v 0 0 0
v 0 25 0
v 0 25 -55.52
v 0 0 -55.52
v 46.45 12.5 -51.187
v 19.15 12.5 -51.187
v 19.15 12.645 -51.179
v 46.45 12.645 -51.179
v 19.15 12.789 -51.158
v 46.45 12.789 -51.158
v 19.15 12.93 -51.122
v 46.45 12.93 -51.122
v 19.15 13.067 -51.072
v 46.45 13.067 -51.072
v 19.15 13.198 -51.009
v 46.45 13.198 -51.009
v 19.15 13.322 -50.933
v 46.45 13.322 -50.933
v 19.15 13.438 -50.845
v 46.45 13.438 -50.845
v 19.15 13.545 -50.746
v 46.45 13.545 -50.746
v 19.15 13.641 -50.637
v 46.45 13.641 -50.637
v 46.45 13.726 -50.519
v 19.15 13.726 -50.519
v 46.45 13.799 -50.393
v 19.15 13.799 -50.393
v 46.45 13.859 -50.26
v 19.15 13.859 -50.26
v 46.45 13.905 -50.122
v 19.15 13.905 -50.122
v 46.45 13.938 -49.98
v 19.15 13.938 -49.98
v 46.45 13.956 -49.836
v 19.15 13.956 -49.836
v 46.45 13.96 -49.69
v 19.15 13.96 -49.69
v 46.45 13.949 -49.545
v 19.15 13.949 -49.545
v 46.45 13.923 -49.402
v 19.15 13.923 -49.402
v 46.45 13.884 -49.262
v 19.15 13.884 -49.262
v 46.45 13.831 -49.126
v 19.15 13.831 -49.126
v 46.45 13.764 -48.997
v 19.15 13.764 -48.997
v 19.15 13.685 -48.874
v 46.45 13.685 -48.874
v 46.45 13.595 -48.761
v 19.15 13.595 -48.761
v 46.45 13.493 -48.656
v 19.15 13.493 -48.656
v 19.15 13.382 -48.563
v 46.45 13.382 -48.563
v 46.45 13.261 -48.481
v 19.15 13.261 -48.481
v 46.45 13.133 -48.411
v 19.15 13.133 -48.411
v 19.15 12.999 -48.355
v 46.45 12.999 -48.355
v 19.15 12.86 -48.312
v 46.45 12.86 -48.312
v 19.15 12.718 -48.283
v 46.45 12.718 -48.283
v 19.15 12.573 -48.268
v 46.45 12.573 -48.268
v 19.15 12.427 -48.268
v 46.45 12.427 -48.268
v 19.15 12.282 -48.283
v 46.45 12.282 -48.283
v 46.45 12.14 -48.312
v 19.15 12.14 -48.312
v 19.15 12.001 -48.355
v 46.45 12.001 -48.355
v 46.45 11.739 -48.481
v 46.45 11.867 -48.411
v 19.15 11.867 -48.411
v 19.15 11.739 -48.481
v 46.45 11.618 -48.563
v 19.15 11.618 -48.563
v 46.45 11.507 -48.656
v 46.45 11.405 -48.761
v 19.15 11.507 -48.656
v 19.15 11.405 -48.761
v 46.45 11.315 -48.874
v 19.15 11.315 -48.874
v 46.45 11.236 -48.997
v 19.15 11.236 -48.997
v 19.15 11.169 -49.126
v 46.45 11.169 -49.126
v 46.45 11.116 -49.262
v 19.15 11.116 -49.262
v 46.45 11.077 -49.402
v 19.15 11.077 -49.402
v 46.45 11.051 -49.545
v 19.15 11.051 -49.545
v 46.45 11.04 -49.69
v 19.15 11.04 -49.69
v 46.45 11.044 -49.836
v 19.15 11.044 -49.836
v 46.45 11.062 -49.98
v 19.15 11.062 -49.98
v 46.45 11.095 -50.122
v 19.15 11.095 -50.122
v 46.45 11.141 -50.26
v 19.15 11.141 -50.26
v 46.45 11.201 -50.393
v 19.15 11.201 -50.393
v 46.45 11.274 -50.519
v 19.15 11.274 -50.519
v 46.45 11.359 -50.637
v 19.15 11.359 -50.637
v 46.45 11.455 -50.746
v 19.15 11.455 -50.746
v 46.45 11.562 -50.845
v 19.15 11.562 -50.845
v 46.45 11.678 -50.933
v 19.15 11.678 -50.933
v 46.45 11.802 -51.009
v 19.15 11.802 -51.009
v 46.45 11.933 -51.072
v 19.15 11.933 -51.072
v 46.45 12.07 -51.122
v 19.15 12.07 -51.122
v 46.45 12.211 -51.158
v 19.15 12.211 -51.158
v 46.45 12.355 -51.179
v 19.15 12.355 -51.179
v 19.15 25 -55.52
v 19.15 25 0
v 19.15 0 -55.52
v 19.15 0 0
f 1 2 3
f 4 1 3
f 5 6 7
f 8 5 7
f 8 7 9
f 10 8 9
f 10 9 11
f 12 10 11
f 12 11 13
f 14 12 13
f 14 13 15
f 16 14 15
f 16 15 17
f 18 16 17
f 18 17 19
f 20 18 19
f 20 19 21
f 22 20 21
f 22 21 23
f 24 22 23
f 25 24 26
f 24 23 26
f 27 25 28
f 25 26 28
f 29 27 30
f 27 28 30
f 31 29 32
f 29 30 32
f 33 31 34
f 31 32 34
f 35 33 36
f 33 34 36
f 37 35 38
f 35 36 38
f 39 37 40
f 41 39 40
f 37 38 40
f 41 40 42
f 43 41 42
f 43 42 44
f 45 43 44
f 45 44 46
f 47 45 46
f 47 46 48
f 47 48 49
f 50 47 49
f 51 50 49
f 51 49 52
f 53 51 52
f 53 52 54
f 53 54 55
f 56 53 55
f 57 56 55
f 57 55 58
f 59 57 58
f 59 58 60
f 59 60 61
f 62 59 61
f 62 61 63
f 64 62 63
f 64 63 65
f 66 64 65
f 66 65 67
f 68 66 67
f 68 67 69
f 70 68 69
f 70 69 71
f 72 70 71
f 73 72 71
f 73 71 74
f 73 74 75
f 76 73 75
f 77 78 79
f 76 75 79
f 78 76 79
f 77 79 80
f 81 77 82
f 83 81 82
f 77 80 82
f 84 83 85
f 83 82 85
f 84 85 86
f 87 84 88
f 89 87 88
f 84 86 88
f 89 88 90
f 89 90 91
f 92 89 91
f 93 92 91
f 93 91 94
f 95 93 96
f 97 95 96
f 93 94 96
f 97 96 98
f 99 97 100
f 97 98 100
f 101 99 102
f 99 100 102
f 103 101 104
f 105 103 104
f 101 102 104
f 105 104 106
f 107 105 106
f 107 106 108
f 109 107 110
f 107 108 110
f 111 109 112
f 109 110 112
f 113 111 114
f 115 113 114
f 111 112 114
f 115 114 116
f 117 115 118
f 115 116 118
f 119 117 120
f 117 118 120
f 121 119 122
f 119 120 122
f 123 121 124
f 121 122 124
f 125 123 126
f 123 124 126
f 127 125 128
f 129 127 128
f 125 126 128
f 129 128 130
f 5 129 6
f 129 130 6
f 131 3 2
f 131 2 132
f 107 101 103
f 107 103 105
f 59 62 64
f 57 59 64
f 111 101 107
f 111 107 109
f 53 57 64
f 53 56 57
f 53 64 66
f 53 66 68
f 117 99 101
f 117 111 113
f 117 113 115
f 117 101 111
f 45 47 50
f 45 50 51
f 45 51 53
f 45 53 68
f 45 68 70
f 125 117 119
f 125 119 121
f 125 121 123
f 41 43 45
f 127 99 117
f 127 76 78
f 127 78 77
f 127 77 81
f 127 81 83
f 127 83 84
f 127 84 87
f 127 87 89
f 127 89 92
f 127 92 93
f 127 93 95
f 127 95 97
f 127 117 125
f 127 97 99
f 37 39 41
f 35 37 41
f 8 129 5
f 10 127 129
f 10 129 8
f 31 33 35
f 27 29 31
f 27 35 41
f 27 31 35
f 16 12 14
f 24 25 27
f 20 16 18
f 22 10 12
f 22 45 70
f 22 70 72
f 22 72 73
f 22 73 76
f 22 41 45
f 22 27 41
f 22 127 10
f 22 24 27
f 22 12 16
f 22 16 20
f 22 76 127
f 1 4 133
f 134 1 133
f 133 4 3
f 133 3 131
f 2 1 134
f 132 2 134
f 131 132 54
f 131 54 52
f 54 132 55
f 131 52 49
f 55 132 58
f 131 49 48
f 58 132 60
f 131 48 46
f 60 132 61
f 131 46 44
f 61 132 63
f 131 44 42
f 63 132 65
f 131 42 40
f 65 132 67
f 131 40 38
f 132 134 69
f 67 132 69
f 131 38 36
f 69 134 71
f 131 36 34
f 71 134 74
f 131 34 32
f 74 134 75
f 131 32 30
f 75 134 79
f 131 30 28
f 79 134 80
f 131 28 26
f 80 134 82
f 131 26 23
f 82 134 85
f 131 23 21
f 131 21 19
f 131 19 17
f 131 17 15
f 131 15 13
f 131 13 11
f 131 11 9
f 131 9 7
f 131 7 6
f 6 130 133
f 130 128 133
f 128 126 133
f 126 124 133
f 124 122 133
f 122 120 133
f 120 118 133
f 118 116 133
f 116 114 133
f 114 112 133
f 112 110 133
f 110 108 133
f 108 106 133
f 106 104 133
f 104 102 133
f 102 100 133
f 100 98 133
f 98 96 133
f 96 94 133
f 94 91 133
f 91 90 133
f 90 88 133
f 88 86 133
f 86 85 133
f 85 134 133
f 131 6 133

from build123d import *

# Parameters (mm, degrees)
ESQUISSE1_W        = 19.15
ESQUISSE1_H        = 55.52
BOSS_EXTRU_1_DEPTH = 25
ESQUISSE3_R        = 1.46
BOSS_EXTRU_2_DEPTH = 46.45


with BuildPart() as part:
    # Esquisse1 → Boss.-Extru.1 (new body)
    with BuildSketch(Plane(origin=(0, 0, 0), x_dir=(1, 0, 0), z_dir=(0, 1, 0))):
        with Locations((9.575, 27.76)):
            Rectangle(ESQUISSE1_W, ESQUISSE1_H)
    extrude(amount=BOSS_EXTRU_1_DEPTH)

    # Esquisse3 → Boss.-Extru.2 (add)
    with BuildSketch(Plane(origin=(0, 0, 0), x_dir=(0, 0, -1), z_dir=(1, 0, 0))):
        with Locations((49.726650103, 12.5)):
            Circle(ESQUISSE3_R)
    extrude(amount=BOSS_EXTRU_2_DEPTH)


solid = part.part
